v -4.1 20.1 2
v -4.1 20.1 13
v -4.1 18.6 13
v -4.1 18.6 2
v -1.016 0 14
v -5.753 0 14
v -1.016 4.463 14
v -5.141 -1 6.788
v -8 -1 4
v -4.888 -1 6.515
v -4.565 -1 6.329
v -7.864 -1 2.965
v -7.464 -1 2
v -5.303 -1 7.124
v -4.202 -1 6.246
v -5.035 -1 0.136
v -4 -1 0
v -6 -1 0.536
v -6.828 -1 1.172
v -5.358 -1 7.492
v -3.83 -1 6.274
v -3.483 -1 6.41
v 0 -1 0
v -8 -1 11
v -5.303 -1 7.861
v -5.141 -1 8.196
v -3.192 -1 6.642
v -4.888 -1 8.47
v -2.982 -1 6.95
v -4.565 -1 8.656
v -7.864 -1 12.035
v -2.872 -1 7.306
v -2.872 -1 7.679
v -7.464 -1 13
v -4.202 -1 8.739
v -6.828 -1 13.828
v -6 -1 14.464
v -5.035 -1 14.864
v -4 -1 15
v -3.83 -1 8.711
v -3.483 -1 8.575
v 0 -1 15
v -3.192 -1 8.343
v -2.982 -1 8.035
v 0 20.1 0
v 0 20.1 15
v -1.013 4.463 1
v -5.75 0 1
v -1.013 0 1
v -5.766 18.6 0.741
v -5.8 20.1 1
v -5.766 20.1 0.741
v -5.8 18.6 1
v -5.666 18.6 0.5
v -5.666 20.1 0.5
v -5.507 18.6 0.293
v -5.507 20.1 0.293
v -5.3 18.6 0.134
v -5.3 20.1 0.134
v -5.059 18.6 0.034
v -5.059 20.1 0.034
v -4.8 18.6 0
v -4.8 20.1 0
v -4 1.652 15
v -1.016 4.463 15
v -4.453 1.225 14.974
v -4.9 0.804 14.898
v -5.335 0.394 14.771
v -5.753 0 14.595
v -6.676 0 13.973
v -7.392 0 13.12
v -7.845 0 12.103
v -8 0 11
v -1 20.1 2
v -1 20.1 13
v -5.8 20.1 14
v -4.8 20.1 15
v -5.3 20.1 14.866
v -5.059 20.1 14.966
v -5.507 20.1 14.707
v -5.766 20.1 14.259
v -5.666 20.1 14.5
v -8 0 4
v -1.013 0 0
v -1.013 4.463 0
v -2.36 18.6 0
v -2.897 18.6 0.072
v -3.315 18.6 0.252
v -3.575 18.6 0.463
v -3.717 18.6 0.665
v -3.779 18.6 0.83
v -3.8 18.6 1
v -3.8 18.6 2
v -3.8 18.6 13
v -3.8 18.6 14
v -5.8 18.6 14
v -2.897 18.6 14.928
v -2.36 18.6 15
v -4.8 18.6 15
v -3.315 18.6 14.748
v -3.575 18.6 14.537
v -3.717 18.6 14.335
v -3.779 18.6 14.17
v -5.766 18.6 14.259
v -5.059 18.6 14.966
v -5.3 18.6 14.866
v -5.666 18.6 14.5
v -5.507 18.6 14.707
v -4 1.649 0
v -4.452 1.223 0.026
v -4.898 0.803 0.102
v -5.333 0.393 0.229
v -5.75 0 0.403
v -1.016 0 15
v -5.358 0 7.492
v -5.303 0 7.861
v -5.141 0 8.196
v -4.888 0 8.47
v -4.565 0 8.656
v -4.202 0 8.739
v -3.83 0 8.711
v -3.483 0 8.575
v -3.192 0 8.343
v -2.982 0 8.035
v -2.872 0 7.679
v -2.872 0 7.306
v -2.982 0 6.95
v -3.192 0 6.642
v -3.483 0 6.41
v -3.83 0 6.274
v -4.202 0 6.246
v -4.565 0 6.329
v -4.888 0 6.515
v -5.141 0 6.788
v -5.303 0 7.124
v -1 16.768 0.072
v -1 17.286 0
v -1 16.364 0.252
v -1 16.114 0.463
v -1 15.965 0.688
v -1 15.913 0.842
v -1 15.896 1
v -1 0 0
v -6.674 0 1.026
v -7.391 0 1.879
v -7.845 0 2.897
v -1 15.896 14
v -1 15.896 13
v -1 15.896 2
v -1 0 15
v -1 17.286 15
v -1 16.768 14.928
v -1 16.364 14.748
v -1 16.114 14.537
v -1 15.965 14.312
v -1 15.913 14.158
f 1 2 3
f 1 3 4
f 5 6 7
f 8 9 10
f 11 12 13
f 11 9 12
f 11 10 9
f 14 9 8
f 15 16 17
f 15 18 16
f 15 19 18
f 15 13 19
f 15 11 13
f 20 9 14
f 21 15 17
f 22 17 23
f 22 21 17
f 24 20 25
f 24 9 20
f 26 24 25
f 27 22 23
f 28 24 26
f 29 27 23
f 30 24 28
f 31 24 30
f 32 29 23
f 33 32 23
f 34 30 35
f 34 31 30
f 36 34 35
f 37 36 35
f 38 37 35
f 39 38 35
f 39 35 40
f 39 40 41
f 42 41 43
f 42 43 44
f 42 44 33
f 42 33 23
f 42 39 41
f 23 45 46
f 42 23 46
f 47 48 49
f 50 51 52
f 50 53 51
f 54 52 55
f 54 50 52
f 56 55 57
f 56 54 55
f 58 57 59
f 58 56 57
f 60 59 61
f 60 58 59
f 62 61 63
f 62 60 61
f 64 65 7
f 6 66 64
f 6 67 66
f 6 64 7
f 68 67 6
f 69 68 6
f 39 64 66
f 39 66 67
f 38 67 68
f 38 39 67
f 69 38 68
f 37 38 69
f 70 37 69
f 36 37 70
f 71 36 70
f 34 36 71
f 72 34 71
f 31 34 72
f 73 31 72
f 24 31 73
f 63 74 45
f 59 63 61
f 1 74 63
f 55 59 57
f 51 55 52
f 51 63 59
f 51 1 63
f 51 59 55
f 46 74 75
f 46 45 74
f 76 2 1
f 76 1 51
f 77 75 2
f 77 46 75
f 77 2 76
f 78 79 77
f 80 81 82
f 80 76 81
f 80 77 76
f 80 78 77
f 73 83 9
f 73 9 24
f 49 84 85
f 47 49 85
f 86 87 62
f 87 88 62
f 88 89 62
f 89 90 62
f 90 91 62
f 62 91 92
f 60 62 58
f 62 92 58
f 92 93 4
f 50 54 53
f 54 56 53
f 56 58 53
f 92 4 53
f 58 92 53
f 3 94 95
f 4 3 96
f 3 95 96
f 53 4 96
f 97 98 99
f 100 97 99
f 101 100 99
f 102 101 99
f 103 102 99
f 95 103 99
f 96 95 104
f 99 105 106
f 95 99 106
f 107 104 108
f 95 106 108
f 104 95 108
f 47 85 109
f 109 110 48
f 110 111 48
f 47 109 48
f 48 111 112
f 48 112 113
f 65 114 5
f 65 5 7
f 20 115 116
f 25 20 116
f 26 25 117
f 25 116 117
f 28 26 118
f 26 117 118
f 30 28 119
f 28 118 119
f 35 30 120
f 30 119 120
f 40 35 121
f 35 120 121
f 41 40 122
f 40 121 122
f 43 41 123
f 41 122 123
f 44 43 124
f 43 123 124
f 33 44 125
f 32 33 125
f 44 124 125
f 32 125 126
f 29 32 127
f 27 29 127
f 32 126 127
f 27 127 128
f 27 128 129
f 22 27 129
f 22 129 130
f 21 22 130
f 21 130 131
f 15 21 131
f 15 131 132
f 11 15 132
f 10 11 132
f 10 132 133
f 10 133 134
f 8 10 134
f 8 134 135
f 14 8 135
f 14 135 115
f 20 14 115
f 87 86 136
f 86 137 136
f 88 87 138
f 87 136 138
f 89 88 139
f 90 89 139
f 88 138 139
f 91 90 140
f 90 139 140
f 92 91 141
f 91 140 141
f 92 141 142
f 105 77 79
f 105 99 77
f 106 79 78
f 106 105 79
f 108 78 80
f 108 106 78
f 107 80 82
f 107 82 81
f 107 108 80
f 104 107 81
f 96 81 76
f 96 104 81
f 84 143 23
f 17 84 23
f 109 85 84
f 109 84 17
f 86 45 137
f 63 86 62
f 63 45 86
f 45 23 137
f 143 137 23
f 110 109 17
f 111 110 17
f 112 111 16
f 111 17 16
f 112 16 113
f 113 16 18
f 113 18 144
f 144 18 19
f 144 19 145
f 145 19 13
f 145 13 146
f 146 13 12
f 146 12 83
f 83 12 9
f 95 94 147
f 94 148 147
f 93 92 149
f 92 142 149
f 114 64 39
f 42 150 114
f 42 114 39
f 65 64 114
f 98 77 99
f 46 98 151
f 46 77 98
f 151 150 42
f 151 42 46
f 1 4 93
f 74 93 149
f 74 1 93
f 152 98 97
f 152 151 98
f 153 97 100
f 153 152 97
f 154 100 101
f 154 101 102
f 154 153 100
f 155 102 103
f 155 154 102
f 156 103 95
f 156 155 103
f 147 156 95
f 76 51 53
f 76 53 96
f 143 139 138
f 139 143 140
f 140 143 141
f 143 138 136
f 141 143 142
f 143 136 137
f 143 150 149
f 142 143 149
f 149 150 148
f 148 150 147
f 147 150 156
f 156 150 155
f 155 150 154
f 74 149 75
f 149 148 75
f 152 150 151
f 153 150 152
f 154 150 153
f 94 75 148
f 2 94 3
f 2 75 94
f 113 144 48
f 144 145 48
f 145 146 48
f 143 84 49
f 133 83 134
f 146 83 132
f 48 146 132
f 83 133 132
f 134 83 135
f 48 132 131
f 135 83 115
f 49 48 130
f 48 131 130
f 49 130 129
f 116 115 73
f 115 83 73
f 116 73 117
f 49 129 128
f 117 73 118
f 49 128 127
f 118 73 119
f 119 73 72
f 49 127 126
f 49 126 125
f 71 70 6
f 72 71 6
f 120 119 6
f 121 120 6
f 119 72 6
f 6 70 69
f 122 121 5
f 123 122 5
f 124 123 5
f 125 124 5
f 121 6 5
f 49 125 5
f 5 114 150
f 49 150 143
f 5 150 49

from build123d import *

# Parameters (mm, degrees)
F1_E1_W   = 20.1
F1_E1_H   = 15
F2_DEPTH  = 1
F1_E0_W   = 8
F1_E0_H   = 15
F3_DEPTH  = 1
F5_DEPTH  = 1
F7_DEPTH  = 1
F9_DEPTH  = 1.5
F11_R     = 4
F12_R     = 1
F13_SIZE2 = 2.7039285695
F13_SIZE  = 2.8
F14_R     = 1
F16_D     = 2.5
F16_DEPTH = 3
F16_TIP   = 0.7510757738


with BuildPart() as f2:
    # F1_E1 (on explicit) → F2 (new body)
    with BuildSketch(Plane.YZ):
        with Locations((10.05, 7.5)):
            Rectangle(F1_E1_W, F1_E1_H)
    extrude(amount=-F2_DEPTH)

    # F1_E0 (on explicit) → F3 (join)
    with BuildSketch(Plane(origin=(-8, 0, 0), x_dir=(1, 0, 0), z_dir=(0, -1, 0))):
        with Locations((4, 7.5)):
            Rectangle(F1_E0_W, F1_E0_H)
    extrude(amount=F3_DEPTH)

    # F4 (on Top) → F5 (join)
    with BuildSketch(Plane.XY):
        Polygon((-5.7501993142, 0), (-1.0129548609, 0), (-1.0129548609, 4.4631827623), align=None)
    extrude(amount=F5_DEPTH)

    # F6 (on face) → F7 (join)
    with BuildSketch(Plane.XY.offset(15)):
        Polygon((-5.7530710474, 0), (-1.0158265941, 0), (-1.0158265941, 4.4631827623), align=None)
    extrude(amount=-F7_DEPTH)

    # F8 (on face) → F9 (join)
    with BuildSketch(Plane(origin=(0, 20.1, 0), x_dir=(-1, 0, 0), z_dir=(0, 1, 0))):
        Polygon((5.8, 15), (0, 15), (0, 13), (4.1, 13), (4.1, 2), (0, 2), (0, 0), (5.8, 0), align=None)
    extrude(amount=-F9_DEPTH)

    # F10: union 

    # F11
    f11_edges = [f2.edges().sort_by_distance(p)[0] for p in [
        (-8, -0.5, 0),
        (-8, -0.5, 15),
    ]]
    fillet(f11_edges, radius=F11_R)

    # F12
    f12_edges = [f2.edges().sort_by_distance(p)[0] for p in [
        (-5.8, 19.35, 0),
        (-5.8, 19.35, 15),
    ]]
    fillet(f12_edges, radius=F12_R)

    # F13
    f13_edges = [f2.edges().sort_by_distance(p)[0] for p in [
        (-1, 18.6, 1),
        (-1, 18.6, 14),
    ]]
    chamfer(f13_edges, length=F13_SIZE, length2=F13_SIZE2)

    # F14
    f14_edges = [f2.edges().sort_by_distance(p)[0] for p in [
        (-2.4, 17.248036, 0),
        (-2.4, 17.248036, 15),
    ]]
    fillet(f14_edges, radius=F14_R)

    # F16
    with Locations(Plane.XZ.offset(1)):
        with Locations((-4.1083735414, 7.4923457578)):
            Hole(F16_D / 2, depth=F16_DEPTH)
            with Locations((0, 0, -(F16_DEPTH + F16_TIP / 2))):  # 118° drill point
                Cone(0, F16_D / 2, F16_TIP, mode=Mode.SUBTRACT)


solid = f2.part
